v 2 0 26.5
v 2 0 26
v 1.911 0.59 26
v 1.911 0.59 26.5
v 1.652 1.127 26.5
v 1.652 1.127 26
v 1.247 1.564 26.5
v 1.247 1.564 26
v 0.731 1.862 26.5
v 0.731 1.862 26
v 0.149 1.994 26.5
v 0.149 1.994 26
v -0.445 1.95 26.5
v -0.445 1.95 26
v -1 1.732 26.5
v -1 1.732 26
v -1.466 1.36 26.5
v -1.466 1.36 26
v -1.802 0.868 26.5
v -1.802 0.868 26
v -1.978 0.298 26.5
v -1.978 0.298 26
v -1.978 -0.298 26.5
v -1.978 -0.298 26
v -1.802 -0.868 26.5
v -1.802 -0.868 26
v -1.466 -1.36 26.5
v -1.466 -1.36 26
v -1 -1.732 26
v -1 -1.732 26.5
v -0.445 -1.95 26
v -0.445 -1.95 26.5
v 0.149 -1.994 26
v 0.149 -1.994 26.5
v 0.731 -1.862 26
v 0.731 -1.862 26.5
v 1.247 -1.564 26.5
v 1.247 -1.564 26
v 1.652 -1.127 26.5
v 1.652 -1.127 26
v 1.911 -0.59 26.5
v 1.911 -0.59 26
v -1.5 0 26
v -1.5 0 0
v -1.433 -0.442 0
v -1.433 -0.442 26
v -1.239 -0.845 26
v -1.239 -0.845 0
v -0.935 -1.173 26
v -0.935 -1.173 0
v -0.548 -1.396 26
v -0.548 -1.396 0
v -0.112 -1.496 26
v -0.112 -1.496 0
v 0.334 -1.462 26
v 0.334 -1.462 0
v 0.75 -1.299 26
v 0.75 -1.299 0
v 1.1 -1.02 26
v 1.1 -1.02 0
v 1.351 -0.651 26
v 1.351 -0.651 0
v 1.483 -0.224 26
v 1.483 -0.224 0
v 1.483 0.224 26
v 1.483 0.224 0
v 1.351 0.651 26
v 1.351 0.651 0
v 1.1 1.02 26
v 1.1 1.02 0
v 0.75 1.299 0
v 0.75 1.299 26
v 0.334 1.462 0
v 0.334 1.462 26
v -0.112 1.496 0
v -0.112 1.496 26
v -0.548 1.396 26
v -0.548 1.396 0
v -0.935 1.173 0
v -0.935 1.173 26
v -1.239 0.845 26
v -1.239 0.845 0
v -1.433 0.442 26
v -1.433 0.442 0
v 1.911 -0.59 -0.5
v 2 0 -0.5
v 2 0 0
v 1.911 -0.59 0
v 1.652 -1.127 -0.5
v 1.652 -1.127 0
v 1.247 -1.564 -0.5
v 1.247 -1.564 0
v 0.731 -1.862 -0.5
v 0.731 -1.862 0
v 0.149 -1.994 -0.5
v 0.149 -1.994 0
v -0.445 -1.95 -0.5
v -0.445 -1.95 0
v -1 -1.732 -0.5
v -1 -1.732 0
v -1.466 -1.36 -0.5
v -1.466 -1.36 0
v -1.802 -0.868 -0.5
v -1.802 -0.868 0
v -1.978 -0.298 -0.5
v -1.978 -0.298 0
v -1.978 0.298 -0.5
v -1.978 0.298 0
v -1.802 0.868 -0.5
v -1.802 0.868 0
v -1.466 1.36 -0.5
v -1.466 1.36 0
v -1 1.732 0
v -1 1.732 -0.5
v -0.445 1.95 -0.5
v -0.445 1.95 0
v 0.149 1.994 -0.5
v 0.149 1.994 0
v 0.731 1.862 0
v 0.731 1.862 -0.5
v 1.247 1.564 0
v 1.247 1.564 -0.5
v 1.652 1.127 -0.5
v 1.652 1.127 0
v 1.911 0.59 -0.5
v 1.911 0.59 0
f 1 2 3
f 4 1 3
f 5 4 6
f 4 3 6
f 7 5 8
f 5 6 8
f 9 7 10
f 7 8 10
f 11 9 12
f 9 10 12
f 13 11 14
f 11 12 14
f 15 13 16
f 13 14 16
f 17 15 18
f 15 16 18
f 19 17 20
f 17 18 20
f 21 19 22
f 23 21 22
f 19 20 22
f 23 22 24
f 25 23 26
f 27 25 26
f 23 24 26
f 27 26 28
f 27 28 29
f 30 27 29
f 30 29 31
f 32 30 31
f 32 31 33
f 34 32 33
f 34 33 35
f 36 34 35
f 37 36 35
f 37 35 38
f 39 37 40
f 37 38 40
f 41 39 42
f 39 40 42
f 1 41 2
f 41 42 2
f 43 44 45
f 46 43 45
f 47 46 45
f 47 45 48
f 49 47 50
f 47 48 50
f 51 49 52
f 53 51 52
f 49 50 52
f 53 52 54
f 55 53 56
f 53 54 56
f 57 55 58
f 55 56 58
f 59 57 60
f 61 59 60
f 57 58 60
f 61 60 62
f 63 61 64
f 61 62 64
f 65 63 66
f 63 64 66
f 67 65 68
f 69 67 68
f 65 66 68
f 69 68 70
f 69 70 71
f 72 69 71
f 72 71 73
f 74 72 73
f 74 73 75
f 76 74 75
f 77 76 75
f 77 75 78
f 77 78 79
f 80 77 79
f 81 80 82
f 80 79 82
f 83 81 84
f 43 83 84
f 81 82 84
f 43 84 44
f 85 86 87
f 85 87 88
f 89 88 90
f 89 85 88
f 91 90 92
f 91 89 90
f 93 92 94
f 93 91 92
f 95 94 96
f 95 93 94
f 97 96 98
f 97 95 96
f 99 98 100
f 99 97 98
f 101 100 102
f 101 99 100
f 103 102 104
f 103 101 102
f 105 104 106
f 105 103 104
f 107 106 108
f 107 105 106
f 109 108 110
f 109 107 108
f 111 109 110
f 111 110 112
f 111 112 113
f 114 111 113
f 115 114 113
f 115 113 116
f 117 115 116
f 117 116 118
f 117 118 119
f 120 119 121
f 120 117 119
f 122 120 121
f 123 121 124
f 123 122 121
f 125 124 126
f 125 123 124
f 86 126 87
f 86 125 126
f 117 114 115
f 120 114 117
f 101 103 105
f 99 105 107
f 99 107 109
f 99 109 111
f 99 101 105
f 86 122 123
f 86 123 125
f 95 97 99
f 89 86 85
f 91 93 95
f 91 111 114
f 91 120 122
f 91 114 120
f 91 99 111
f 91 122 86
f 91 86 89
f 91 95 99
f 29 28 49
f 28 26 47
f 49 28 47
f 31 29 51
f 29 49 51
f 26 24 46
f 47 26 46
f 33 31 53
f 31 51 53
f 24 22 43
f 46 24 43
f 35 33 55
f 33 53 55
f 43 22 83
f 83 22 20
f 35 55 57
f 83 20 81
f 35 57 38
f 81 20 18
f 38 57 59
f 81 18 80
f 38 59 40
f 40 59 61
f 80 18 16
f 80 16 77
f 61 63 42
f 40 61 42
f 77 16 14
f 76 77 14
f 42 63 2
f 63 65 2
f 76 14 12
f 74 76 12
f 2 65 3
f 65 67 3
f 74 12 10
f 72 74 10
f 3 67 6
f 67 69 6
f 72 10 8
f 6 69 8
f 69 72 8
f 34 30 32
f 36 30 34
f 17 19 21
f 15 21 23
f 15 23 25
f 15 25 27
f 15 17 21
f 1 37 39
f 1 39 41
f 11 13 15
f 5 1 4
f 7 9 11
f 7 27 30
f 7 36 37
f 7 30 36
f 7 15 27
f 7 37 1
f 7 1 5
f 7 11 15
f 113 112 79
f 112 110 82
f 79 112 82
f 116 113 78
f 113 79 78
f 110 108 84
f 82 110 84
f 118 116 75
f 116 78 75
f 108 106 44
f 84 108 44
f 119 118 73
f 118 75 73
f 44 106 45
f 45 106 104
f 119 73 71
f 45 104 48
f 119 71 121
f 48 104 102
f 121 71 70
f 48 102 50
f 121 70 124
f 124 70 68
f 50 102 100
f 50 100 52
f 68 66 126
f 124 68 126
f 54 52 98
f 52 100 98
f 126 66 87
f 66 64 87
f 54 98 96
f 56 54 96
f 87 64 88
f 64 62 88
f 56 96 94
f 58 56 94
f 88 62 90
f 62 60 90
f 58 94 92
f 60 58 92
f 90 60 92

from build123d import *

# Parameters (mm, degrees)
ESQUISSE1_R        = 1.5
BOSS_EXTRU_1_DEPTH = 26
ESQUISSE2_R        = 2
BOSS_EXTRU_2_DEPTH = 0.5
BOSS_EXTRU_4_START = 0.5
ESQUISSE4_R        = 2
BOSS_EXTRU_4_DEPTH = 0.5


with BuildPart() as part:
    # Esquisse1 → Boss.-Extru.1 (new body)
    with BuildSketch(Plane.XY):
        with Locations(Location((0, 0, 0), (0, 0, 180))):
            Circle(ESQUISSE1_R)
    extrude(amount=BOSS_EXTRU_1_DEPTH)

    # Esquisse2 → Boss.-Extru.2 (add)
    with BuildSketch(Plane.XY.offset(26)):
        Circle(ESQUISSE2_R)
    extrude(amount=BOSS_EXTRU_2_DEPTH)

    # Esquisse4 → Boss.-Extru.4 (add)
    with BuildSketch(Plane(origin=(0, 0, 0), x_dir=(-1, 0, 0), z_dir=(0, 0, -1)).offset(BOSS_EXTRU_4_START)):
        with Locations(Location((0, 0, 0), (0, 0, 180))):
            Circle(ESQUISSE4_R)
    extrude(amount=-BOSS_EXTRU_4_DEPTH)


solid = part.part
